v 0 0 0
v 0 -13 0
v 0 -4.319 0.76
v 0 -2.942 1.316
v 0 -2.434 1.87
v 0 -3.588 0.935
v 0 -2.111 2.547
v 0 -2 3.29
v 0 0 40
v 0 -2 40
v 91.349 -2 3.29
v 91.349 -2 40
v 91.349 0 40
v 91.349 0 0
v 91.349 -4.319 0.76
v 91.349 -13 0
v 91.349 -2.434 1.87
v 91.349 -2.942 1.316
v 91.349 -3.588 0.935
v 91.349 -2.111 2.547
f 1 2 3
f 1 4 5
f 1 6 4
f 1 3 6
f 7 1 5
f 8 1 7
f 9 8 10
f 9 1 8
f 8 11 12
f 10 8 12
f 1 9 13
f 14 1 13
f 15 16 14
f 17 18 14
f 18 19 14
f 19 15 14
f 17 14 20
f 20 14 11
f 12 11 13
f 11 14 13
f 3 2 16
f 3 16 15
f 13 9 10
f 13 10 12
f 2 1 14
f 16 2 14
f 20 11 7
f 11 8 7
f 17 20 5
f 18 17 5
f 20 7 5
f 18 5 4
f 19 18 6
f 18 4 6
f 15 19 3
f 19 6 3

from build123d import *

# Parameters (mm, degrees)
F0_W     = 91.34856
F0_H     = 40
F1_DEPTH = 13
F3_DEPTH = 127
F4_R     = 2.54


with BuildPart() as f1:
    # F0 (on Front) → F1 (new body)
    with BuildSketch(Plane.XZ):
        with Locations((45.67428, 20)):
            Rectangle(F0_W, F0_H)
    extrude(amount=F1_DEPTH)

    # F2 (on face) → F3 (cut)
    with BuildSketch(Plane.YZ.offset(91.34856)):
        Polygon((-13, 40), (-13, 0), (-2, 0.962375), (-2, 40), align=None)
    extrude(amount=-F3_DEPTH, mode=Mode.SUBTRACT)

    # F4
    f4_edges = [f1.edges().sort_by_distance(p)[0] for p in [
        (45.67428, -2, 0.962375),
    ]]
    fillet(f4_edges, radius=F4_R)


solid = f1.part
